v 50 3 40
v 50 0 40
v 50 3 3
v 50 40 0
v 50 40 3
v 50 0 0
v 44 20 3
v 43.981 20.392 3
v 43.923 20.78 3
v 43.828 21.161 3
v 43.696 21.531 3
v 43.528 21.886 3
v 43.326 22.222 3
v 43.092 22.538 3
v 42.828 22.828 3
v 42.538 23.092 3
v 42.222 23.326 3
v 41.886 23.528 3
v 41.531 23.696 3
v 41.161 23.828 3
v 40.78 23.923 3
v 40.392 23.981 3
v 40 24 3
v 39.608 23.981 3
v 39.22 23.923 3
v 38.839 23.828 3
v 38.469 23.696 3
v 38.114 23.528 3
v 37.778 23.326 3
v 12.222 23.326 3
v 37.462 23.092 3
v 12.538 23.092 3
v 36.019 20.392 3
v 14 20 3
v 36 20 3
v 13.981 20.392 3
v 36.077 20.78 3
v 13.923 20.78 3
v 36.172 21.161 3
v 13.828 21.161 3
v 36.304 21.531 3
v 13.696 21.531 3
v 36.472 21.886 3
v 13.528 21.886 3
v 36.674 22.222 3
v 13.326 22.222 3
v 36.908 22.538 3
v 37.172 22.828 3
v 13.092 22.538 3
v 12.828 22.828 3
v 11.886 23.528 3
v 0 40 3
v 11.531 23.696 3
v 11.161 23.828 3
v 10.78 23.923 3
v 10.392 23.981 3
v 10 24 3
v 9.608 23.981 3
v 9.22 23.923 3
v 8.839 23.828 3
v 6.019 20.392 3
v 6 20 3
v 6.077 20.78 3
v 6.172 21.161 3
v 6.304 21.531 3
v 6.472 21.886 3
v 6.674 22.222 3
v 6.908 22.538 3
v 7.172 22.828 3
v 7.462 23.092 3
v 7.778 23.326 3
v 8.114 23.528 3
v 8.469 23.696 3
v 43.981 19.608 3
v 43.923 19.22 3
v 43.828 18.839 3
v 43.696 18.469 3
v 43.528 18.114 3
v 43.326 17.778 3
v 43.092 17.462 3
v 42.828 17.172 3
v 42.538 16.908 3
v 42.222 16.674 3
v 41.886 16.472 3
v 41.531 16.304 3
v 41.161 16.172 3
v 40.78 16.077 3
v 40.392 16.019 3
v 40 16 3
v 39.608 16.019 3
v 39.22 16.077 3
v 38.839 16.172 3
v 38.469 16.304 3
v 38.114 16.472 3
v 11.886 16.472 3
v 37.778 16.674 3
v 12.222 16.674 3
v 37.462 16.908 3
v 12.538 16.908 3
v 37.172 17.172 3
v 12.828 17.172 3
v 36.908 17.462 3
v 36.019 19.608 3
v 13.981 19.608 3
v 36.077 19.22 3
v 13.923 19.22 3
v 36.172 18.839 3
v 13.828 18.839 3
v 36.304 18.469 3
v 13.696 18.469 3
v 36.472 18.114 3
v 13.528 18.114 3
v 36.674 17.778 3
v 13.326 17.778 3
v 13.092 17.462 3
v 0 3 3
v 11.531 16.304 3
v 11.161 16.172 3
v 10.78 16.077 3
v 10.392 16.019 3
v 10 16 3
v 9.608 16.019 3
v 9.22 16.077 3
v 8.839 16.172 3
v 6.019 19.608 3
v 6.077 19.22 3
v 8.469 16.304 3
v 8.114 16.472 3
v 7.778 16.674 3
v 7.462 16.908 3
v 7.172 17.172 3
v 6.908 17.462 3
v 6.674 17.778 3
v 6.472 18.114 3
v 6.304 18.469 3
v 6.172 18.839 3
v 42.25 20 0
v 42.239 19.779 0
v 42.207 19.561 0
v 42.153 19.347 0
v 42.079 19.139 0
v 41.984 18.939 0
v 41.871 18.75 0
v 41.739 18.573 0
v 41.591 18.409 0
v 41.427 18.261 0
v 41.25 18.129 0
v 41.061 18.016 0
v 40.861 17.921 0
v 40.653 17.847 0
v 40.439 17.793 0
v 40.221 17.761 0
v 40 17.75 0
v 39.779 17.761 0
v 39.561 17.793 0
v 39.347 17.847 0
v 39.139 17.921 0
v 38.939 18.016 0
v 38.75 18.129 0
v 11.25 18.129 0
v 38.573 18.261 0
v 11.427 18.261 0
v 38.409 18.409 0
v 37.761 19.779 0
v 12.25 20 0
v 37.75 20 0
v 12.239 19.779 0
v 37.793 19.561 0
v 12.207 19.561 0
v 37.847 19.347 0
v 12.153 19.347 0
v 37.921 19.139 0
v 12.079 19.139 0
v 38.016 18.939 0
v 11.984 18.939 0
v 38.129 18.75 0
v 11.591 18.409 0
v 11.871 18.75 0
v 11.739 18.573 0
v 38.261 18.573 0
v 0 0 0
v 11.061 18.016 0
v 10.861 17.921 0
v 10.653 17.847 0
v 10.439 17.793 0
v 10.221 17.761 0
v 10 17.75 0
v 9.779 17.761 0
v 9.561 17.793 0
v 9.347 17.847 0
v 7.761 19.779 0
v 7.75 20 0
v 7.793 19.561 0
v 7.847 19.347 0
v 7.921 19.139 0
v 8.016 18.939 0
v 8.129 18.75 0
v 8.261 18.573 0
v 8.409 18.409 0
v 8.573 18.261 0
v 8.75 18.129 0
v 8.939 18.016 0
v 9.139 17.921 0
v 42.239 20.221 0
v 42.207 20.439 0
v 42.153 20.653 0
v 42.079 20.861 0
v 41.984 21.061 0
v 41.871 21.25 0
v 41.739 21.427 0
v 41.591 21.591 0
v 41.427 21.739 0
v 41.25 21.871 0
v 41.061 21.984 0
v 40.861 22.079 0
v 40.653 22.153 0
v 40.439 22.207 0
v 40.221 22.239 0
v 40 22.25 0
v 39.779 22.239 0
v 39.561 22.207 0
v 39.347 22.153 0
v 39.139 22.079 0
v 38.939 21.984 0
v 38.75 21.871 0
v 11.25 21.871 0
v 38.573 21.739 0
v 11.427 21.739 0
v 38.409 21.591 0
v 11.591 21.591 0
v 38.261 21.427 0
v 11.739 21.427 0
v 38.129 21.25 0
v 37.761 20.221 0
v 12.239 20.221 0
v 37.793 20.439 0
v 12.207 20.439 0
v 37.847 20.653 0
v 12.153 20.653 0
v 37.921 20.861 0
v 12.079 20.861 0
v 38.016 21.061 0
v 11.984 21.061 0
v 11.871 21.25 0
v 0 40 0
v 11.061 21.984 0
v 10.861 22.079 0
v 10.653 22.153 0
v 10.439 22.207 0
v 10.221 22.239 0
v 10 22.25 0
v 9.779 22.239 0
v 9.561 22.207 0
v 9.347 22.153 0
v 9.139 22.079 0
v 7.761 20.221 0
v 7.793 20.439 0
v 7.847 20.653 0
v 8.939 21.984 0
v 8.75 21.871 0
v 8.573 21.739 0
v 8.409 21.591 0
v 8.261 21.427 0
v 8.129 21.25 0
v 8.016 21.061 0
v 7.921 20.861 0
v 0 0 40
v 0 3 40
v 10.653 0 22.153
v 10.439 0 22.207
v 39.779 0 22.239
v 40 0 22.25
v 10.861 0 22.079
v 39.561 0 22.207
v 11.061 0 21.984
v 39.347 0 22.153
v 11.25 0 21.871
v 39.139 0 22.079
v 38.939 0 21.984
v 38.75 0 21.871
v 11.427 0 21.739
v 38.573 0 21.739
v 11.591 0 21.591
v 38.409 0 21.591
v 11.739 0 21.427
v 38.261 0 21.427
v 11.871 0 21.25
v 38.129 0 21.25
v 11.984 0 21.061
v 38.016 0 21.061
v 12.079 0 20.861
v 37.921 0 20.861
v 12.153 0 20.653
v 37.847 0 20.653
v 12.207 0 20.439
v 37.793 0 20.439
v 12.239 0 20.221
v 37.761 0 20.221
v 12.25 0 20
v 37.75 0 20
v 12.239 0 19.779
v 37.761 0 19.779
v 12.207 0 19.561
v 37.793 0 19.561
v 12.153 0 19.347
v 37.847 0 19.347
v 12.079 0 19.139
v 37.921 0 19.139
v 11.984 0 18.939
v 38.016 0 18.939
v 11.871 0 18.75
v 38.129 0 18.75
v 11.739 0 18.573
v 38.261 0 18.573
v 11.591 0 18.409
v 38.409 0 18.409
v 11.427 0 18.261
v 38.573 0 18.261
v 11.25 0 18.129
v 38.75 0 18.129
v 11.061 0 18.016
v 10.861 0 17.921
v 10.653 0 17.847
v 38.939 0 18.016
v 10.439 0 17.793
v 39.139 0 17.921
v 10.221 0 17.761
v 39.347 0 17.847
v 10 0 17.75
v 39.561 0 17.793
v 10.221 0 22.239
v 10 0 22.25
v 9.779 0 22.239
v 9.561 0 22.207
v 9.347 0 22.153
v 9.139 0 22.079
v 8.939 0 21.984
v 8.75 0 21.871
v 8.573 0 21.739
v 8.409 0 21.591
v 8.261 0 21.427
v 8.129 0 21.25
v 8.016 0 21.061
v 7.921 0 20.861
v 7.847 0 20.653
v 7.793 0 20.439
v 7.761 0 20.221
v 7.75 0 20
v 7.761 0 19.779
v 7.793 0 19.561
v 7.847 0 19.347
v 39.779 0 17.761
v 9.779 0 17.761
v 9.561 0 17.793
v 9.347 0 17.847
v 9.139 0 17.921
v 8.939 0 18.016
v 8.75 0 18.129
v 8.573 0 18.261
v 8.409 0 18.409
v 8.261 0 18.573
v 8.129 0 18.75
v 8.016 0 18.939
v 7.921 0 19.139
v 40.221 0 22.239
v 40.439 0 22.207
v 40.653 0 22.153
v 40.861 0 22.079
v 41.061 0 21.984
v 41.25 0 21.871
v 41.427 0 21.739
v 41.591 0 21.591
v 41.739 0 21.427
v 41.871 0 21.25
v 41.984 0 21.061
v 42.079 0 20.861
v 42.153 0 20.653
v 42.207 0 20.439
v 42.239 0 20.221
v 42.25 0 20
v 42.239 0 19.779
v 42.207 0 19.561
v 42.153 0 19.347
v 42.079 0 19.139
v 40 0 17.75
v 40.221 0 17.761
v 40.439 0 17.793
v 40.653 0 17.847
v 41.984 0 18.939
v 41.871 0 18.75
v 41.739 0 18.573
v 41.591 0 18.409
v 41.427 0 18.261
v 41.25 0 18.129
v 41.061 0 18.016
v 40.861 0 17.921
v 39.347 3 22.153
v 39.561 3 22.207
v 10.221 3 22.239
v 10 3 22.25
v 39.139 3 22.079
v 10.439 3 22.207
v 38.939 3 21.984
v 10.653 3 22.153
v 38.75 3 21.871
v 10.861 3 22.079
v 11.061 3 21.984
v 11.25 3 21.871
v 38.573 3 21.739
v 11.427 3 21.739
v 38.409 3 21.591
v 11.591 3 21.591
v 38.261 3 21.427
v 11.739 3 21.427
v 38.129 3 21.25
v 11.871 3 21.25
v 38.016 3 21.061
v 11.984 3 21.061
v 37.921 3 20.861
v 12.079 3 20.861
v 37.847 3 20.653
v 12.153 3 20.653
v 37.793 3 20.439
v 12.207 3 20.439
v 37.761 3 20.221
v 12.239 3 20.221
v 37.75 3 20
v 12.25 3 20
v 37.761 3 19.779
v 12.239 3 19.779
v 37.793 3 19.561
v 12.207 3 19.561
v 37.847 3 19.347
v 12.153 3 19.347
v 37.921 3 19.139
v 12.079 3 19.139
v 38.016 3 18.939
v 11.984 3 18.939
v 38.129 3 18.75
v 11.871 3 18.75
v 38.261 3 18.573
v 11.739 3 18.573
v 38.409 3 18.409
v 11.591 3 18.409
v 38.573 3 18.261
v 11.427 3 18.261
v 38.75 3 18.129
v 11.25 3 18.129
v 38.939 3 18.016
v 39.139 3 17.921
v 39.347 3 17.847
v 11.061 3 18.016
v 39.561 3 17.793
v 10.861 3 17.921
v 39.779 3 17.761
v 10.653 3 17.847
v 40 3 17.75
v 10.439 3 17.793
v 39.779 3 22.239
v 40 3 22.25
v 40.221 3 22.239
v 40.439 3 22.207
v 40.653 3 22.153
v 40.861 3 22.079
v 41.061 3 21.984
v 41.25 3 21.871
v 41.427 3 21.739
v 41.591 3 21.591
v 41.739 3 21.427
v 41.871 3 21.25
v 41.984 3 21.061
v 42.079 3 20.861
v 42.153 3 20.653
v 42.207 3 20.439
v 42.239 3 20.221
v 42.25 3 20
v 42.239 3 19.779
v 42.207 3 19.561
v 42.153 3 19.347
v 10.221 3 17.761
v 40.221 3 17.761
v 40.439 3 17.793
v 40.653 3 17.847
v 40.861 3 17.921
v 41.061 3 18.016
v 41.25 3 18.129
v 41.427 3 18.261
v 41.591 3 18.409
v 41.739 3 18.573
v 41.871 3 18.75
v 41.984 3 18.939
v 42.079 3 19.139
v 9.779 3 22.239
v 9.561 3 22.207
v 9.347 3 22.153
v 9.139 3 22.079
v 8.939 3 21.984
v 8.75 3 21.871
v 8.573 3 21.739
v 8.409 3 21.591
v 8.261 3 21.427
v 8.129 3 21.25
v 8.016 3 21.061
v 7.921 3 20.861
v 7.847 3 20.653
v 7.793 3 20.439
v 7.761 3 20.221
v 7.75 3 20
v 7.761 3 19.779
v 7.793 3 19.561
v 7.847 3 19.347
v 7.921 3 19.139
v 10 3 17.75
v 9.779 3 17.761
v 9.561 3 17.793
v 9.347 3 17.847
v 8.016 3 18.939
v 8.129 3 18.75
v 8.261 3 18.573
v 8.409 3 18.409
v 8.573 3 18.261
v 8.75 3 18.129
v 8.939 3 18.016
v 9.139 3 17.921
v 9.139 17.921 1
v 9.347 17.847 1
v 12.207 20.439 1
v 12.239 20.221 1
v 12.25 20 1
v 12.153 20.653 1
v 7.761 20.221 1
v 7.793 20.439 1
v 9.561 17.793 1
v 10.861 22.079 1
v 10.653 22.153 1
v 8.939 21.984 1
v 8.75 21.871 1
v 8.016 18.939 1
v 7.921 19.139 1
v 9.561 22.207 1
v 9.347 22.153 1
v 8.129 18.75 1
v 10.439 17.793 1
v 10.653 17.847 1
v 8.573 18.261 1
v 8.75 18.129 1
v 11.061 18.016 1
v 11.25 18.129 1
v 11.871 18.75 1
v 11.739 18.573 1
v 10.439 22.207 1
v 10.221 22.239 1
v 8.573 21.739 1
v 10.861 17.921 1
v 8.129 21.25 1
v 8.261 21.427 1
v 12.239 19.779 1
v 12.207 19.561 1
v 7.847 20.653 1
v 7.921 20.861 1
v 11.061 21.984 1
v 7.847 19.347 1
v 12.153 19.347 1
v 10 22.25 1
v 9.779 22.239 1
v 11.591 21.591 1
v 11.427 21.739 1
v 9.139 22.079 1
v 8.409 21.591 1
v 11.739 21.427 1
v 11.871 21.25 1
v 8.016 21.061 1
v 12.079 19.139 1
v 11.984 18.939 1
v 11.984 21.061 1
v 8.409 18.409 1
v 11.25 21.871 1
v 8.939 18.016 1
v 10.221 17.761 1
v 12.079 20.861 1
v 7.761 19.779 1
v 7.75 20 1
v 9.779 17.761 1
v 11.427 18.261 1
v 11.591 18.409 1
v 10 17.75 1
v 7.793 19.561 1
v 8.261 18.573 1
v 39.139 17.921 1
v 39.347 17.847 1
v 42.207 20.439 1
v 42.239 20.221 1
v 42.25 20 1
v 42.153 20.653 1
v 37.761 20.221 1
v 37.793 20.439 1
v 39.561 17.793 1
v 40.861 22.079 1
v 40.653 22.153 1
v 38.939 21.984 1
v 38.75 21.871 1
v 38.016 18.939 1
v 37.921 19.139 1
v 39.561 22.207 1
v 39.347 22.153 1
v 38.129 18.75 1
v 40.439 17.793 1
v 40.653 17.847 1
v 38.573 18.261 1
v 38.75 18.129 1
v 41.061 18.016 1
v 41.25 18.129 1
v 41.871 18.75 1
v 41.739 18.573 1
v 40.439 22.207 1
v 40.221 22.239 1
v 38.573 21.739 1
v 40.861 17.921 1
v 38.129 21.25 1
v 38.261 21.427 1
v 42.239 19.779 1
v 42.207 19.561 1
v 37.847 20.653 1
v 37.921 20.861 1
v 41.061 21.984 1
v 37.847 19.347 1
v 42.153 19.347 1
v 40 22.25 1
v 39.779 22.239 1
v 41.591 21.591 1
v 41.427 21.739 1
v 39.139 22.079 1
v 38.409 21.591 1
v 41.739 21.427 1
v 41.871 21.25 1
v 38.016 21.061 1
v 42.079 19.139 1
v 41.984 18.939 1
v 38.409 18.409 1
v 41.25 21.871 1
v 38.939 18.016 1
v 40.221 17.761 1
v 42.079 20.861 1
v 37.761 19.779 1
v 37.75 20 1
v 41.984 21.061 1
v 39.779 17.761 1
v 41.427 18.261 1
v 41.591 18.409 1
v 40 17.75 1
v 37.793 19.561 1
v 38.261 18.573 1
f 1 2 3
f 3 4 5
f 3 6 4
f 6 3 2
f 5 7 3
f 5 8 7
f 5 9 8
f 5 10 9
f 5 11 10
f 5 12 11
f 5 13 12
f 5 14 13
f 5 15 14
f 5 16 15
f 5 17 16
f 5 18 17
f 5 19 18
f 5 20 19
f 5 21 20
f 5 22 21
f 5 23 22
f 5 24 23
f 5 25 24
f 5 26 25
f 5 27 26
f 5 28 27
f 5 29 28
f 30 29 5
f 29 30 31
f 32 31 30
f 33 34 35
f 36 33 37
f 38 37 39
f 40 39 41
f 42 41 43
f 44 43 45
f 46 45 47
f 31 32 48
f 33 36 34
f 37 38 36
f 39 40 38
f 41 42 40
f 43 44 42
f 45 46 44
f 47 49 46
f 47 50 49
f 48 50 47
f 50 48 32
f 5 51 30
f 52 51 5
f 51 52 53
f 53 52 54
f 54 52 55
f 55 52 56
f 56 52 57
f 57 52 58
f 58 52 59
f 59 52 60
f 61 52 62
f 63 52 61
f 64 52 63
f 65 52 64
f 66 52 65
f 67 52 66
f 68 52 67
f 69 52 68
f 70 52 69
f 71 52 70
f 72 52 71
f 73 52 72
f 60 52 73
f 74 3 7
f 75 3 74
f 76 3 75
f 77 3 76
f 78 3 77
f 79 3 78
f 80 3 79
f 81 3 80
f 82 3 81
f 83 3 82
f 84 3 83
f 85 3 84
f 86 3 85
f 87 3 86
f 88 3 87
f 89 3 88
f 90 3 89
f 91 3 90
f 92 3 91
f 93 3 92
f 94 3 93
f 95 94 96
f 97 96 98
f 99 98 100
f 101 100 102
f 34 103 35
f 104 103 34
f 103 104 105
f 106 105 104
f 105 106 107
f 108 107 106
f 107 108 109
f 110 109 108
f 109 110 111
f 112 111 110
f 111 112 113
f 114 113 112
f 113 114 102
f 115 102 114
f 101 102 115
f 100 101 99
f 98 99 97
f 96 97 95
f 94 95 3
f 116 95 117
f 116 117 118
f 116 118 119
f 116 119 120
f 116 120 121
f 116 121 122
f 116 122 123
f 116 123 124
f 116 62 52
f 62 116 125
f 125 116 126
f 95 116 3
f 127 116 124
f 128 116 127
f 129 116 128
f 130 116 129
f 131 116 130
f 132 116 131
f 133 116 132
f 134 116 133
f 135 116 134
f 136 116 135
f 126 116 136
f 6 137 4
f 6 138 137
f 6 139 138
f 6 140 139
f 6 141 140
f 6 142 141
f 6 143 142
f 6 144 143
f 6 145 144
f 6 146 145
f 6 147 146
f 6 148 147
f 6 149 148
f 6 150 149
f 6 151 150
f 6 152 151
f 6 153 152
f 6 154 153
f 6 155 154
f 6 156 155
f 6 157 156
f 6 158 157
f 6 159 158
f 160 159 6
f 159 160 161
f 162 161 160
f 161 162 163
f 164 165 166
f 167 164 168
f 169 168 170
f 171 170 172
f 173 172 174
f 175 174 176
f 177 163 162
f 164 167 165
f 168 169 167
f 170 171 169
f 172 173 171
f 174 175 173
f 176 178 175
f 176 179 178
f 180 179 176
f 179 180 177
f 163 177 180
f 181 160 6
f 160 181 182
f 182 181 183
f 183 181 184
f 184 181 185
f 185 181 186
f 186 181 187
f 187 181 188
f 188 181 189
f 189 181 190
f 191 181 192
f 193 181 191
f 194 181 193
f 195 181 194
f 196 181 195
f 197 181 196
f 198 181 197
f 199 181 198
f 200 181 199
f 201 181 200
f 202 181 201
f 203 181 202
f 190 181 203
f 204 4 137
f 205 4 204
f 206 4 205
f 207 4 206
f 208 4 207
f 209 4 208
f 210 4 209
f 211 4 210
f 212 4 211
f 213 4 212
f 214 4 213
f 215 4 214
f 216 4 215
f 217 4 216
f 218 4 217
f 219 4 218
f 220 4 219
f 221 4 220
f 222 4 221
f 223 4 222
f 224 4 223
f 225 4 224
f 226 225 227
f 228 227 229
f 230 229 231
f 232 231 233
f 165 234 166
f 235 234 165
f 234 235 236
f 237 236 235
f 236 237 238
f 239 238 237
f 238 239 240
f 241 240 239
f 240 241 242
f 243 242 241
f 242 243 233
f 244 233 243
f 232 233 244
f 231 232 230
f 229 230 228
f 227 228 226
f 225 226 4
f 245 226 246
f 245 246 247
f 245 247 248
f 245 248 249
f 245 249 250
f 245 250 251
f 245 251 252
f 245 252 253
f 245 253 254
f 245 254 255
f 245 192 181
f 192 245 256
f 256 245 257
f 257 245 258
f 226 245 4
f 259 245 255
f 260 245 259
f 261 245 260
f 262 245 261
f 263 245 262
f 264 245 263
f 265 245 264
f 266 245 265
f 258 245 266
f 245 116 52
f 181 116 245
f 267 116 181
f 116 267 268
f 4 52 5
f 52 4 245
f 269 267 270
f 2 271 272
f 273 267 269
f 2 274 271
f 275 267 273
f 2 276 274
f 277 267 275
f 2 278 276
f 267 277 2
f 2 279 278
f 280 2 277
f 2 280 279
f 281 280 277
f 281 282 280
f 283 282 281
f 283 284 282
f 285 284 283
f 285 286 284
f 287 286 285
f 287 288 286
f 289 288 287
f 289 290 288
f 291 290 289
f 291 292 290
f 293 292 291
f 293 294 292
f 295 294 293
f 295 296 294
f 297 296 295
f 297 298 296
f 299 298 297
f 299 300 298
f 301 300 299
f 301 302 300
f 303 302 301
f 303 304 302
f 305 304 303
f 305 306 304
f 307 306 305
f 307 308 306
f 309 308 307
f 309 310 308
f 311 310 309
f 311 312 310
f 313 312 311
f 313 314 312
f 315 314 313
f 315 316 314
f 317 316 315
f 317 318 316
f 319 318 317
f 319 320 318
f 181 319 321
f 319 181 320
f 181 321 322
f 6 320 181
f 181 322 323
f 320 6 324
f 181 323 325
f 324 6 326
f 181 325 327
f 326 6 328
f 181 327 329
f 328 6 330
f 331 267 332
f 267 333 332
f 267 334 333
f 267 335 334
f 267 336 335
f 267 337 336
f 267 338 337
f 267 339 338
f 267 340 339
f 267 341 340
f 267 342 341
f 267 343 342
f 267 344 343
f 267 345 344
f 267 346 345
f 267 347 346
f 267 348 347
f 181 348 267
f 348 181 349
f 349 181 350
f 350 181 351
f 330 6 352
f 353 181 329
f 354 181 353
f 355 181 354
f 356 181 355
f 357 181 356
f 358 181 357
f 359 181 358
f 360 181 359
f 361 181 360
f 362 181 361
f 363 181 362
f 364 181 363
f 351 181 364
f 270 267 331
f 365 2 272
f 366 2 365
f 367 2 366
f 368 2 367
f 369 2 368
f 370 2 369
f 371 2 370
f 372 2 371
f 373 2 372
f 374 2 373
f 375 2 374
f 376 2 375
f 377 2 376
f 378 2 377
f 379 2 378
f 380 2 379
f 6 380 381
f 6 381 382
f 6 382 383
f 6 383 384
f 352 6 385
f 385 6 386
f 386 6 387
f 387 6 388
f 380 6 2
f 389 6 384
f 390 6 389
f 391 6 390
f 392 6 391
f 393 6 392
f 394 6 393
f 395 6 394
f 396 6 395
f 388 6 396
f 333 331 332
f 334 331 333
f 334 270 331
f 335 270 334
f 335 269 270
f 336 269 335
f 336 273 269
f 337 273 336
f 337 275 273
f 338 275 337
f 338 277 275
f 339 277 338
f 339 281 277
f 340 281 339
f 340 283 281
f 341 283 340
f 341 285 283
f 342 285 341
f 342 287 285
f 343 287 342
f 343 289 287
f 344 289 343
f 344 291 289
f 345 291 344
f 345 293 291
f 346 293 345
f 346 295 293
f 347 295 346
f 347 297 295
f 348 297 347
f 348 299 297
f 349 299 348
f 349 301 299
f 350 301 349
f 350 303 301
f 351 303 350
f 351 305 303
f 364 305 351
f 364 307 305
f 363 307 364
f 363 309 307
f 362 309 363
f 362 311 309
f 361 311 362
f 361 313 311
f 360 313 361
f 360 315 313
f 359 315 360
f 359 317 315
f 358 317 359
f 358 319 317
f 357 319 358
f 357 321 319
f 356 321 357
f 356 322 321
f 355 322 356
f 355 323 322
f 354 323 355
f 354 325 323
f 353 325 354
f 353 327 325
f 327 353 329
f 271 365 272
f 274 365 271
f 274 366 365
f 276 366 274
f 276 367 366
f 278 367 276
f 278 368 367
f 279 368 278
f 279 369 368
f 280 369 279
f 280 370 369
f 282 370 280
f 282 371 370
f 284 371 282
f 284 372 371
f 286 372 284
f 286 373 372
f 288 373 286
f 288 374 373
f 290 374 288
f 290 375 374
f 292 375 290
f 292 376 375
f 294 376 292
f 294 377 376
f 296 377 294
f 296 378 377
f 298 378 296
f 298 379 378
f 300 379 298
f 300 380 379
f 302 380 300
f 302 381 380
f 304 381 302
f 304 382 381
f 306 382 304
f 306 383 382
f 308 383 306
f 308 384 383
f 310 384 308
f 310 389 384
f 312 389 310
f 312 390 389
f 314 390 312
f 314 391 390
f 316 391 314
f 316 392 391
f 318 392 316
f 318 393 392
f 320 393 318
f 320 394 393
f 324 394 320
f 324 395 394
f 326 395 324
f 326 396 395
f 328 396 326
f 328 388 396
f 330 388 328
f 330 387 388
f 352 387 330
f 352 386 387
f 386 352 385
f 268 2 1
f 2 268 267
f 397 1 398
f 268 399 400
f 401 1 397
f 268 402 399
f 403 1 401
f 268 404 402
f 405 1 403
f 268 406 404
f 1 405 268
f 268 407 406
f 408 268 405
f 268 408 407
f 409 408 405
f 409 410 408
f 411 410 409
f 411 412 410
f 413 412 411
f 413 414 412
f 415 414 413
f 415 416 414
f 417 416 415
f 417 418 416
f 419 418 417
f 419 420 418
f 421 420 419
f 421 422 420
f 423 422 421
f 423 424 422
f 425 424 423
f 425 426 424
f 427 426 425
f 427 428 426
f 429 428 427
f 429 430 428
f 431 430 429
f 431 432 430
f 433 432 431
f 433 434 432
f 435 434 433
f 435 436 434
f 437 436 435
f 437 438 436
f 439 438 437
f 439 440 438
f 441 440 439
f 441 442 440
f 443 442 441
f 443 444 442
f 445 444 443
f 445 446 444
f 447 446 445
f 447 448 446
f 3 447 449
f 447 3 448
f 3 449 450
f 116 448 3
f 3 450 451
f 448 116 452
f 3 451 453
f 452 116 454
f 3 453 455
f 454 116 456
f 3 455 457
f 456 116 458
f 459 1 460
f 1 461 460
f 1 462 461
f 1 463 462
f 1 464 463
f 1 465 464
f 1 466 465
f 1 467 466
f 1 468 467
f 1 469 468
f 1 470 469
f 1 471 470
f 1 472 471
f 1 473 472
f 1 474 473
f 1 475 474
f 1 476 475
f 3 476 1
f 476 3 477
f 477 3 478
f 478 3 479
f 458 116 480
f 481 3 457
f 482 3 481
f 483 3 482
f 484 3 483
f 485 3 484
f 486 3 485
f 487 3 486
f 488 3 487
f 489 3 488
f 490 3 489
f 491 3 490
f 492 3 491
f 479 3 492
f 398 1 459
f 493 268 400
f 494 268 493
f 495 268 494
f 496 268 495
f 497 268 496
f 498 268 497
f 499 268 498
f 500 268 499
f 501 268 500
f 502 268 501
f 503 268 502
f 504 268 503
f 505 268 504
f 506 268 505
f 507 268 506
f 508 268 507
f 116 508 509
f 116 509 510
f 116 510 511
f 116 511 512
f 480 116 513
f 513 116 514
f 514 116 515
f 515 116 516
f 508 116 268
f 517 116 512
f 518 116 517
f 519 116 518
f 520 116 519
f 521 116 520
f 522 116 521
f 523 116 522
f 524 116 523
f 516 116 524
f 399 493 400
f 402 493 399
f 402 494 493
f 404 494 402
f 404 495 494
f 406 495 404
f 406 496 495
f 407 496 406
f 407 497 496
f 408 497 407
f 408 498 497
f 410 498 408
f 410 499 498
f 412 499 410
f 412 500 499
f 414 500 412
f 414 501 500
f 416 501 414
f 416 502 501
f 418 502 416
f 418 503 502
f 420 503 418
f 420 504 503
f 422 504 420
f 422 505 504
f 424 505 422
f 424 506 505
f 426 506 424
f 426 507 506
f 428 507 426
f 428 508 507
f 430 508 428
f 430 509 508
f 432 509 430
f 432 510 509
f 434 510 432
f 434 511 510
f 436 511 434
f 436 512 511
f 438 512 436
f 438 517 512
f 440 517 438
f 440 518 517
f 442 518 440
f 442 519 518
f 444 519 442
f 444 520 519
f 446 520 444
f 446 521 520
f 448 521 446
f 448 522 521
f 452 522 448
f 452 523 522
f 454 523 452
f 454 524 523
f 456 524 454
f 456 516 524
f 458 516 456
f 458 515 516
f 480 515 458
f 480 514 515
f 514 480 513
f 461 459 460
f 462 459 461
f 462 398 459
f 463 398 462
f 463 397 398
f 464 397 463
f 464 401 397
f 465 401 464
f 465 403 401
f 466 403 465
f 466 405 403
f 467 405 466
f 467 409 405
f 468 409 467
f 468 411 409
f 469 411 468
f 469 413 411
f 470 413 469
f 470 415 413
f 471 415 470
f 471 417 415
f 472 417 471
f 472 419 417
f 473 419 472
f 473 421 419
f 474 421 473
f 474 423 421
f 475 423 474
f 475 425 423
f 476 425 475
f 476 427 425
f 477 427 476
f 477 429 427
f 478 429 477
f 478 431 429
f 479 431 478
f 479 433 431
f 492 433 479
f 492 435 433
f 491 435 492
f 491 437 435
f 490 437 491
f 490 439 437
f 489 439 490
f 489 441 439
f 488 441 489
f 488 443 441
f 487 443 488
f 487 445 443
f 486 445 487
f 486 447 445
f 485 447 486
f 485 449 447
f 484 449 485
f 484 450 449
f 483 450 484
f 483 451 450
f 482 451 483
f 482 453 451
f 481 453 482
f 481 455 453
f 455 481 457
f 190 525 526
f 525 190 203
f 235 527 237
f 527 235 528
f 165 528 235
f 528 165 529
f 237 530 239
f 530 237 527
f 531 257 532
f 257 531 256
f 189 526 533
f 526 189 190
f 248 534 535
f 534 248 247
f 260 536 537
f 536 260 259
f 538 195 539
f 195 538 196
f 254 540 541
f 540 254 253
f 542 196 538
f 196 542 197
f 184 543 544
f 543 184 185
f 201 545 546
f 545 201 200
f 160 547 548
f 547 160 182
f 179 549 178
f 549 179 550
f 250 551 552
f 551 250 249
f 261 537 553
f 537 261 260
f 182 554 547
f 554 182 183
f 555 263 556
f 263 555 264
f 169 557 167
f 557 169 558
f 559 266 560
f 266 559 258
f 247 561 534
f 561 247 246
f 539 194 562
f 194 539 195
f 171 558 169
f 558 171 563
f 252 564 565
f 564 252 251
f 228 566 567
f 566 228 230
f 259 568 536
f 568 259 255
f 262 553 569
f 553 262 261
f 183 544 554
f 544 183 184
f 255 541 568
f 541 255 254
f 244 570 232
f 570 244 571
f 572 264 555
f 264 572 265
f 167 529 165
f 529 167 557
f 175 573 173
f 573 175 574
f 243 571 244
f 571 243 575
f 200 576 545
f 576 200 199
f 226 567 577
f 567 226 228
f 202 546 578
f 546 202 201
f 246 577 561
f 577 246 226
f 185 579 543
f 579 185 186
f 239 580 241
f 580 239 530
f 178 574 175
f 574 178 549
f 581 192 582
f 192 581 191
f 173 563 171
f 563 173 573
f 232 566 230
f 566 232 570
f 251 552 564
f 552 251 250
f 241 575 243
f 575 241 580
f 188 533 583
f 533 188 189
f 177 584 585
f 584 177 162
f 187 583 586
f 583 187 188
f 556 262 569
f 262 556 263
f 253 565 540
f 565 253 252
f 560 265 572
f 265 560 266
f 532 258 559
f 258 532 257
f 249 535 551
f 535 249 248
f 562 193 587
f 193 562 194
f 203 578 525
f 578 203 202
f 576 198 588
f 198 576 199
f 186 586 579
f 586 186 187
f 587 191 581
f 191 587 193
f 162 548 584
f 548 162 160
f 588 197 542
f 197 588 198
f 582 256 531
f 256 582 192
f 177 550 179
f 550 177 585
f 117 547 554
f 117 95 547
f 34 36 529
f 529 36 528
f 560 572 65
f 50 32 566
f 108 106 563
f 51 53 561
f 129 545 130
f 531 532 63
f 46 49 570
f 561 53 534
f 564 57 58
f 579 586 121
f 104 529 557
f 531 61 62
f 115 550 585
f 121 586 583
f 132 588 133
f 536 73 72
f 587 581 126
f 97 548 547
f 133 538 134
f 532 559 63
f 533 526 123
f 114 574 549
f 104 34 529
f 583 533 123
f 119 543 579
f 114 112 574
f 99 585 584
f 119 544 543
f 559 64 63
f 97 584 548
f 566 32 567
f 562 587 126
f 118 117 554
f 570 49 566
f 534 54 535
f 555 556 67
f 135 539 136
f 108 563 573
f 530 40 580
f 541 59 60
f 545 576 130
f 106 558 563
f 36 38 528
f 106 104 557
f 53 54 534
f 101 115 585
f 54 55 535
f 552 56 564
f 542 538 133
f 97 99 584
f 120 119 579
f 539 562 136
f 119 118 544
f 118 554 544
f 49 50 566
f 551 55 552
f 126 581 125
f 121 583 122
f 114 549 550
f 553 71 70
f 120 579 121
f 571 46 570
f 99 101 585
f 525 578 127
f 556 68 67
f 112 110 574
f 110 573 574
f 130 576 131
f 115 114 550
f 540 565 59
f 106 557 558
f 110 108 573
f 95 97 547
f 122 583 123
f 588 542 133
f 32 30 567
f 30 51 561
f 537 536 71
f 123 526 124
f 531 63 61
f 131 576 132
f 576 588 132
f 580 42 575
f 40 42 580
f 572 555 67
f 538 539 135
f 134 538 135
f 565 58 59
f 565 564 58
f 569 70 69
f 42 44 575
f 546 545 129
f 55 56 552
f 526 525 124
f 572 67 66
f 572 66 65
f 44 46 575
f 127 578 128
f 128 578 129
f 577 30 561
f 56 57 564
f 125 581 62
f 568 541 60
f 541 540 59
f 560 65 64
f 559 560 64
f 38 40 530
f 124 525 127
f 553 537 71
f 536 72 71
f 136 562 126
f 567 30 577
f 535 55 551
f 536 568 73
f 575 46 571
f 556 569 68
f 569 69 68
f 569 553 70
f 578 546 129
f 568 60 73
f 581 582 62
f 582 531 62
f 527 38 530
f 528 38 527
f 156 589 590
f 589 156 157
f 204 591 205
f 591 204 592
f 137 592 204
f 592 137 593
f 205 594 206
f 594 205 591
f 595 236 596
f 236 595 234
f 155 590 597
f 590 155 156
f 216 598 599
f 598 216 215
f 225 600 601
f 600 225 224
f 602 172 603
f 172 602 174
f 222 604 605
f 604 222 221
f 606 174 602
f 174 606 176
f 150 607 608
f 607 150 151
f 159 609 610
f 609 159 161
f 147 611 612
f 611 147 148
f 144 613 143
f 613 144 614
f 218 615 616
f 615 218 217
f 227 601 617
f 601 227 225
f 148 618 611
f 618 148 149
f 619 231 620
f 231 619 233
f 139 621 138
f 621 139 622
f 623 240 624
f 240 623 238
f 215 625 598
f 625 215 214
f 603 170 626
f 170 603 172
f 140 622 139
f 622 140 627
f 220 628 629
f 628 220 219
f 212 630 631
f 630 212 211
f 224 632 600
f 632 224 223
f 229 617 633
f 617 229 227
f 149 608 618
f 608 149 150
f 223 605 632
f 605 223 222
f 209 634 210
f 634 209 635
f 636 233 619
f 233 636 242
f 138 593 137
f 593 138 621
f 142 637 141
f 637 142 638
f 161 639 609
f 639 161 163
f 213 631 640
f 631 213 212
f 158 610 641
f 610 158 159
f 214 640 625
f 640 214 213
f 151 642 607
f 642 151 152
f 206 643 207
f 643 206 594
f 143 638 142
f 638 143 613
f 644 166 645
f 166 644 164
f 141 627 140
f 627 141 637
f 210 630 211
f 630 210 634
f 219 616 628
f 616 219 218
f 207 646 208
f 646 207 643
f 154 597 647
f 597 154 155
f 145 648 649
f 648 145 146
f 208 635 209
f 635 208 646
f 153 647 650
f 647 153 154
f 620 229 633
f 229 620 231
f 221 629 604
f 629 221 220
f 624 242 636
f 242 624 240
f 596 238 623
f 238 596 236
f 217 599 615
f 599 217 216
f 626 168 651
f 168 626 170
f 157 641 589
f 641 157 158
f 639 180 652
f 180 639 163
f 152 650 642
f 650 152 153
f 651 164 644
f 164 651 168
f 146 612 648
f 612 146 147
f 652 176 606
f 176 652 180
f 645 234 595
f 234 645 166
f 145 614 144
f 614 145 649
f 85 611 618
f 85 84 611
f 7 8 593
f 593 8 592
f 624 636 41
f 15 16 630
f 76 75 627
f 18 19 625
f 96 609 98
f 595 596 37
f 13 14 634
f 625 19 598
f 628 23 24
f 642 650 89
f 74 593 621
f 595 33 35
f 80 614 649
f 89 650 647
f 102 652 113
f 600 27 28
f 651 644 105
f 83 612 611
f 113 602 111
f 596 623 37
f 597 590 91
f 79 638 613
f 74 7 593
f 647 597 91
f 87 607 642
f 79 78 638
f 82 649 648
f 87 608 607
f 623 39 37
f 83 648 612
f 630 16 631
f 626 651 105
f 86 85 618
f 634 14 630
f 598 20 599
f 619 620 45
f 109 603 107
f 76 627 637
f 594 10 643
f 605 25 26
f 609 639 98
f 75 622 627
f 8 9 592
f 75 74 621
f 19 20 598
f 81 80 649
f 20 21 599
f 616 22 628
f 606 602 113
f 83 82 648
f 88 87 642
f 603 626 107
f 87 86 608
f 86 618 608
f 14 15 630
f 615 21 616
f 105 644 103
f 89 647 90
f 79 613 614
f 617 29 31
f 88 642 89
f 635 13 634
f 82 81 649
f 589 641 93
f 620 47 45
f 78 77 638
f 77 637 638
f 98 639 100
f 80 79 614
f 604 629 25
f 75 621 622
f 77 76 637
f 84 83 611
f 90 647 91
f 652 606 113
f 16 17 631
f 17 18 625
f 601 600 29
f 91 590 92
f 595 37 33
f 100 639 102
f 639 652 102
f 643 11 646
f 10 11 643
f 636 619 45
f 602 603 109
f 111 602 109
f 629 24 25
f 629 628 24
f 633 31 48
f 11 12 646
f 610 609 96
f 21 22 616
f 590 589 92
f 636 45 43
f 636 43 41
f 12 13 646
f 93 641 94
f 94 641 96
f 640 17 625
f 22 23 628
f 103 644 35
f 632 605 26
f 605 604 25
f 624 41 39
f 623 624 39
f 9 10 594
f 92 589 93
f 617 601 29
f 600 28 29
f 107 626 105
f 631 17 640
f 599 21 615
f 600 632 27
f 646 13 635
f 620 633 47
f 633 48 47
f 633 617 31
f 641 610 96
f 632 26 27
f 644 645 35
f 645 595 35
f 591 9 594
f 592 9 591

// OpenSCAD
$fn = 64;

// L-bracket parameters
plate_thickness = 3;   // both plates 3 mm thick
hor_width = 50;
hor_depth = 40;
vert_width = 50;
vert_height = 40;
hole_diameter = 4.5;
hole_radius = hole_diameter / 2; // 2.25
countersink_diameter = 8;
countersink_radius = countersink_diameter / 2; // 4
countersink_depth = 2;

// Hole centers (as described)
hor_hole_x = [10, 40];     // along X on horizontal plate
hor_hole_y = 20;            // centerline of horizontal plate (along Y)
vert_hole_x = [10, 40];     // along X on vertical plate
vert_hole_z = 20;            // centerline of vertical plate (along Z)
vert_hole_y_outer = 3;       // outer face at +Y side for vertical plate

module LBracket() {
    difference() {
        // Base L-bracket (two flanges)
        union() {
            // Horizontal flange: 50 (X) × 40 (Y) × 3 (Z)
            translate([0, 0, 0]) cube([hor_width, hor_depth, plate_thickness]);
            // Vertical flange: 50 (X) × 3 (Y) × 40 (Z)
            translate([0, 0, 0]) cube([vert_width, plate_thickness, vert_height]);
        }

        // Countersunk through-holes on horizontal flange (top, outer side)
        // 2 holes on centerline, 10 mm from each edge along X
        for (dx = hor_hole_x) {
            // Through hole
            translate([dx, hor_hole_y, 0]) cylinder(h = plate_thickness, r = hole_radius);
            // Countersink seat on outer (top) surface
            translate([dx, hor_hole_y, plate_thickness - countersink_depth + 0.0])
                cylinder(h = countersink_depth, r1 = hole_radius, r2 = countersink_radius);
        }

        // Holes on vertical flange (outer face at +Y)
        // 2 holes along X, centered Z = 20, through thickness Y (3 mm)
        for (dx = vert_hole_x) {
            // Through hole oriented along +Y (need to rotate from Z to Y)
            translate([dx, 0, vert_hole_z])
                rotate([90, 0, 0])
                    cylinder(h = plate_thickness, r = hole_radius);
        }

        // Countersink seats on vertical flange outer face (outer +Y side)
        // Each countersink sits on outer face at y = +3, depth 2 mm toward inner
        for (dx = vert_hole_x) {
            translate([dx, vert_hole_y_outer, vert_hole_z])
                rotate([-90, 0, 0])
                    cylinder(h = countersink_depth, r1 = hole_radius, r2 = countersink_radius);
        }

        // Note: The above vertical-hole operations use rotation to align holes with +Y axis.
        // The hole centers are set so their axes pass through the vertical flange thickness
        // (0 <= y <= 3) and through z ~ 20, keeping holes within the vertical flange.
    }
}

LBracket();
